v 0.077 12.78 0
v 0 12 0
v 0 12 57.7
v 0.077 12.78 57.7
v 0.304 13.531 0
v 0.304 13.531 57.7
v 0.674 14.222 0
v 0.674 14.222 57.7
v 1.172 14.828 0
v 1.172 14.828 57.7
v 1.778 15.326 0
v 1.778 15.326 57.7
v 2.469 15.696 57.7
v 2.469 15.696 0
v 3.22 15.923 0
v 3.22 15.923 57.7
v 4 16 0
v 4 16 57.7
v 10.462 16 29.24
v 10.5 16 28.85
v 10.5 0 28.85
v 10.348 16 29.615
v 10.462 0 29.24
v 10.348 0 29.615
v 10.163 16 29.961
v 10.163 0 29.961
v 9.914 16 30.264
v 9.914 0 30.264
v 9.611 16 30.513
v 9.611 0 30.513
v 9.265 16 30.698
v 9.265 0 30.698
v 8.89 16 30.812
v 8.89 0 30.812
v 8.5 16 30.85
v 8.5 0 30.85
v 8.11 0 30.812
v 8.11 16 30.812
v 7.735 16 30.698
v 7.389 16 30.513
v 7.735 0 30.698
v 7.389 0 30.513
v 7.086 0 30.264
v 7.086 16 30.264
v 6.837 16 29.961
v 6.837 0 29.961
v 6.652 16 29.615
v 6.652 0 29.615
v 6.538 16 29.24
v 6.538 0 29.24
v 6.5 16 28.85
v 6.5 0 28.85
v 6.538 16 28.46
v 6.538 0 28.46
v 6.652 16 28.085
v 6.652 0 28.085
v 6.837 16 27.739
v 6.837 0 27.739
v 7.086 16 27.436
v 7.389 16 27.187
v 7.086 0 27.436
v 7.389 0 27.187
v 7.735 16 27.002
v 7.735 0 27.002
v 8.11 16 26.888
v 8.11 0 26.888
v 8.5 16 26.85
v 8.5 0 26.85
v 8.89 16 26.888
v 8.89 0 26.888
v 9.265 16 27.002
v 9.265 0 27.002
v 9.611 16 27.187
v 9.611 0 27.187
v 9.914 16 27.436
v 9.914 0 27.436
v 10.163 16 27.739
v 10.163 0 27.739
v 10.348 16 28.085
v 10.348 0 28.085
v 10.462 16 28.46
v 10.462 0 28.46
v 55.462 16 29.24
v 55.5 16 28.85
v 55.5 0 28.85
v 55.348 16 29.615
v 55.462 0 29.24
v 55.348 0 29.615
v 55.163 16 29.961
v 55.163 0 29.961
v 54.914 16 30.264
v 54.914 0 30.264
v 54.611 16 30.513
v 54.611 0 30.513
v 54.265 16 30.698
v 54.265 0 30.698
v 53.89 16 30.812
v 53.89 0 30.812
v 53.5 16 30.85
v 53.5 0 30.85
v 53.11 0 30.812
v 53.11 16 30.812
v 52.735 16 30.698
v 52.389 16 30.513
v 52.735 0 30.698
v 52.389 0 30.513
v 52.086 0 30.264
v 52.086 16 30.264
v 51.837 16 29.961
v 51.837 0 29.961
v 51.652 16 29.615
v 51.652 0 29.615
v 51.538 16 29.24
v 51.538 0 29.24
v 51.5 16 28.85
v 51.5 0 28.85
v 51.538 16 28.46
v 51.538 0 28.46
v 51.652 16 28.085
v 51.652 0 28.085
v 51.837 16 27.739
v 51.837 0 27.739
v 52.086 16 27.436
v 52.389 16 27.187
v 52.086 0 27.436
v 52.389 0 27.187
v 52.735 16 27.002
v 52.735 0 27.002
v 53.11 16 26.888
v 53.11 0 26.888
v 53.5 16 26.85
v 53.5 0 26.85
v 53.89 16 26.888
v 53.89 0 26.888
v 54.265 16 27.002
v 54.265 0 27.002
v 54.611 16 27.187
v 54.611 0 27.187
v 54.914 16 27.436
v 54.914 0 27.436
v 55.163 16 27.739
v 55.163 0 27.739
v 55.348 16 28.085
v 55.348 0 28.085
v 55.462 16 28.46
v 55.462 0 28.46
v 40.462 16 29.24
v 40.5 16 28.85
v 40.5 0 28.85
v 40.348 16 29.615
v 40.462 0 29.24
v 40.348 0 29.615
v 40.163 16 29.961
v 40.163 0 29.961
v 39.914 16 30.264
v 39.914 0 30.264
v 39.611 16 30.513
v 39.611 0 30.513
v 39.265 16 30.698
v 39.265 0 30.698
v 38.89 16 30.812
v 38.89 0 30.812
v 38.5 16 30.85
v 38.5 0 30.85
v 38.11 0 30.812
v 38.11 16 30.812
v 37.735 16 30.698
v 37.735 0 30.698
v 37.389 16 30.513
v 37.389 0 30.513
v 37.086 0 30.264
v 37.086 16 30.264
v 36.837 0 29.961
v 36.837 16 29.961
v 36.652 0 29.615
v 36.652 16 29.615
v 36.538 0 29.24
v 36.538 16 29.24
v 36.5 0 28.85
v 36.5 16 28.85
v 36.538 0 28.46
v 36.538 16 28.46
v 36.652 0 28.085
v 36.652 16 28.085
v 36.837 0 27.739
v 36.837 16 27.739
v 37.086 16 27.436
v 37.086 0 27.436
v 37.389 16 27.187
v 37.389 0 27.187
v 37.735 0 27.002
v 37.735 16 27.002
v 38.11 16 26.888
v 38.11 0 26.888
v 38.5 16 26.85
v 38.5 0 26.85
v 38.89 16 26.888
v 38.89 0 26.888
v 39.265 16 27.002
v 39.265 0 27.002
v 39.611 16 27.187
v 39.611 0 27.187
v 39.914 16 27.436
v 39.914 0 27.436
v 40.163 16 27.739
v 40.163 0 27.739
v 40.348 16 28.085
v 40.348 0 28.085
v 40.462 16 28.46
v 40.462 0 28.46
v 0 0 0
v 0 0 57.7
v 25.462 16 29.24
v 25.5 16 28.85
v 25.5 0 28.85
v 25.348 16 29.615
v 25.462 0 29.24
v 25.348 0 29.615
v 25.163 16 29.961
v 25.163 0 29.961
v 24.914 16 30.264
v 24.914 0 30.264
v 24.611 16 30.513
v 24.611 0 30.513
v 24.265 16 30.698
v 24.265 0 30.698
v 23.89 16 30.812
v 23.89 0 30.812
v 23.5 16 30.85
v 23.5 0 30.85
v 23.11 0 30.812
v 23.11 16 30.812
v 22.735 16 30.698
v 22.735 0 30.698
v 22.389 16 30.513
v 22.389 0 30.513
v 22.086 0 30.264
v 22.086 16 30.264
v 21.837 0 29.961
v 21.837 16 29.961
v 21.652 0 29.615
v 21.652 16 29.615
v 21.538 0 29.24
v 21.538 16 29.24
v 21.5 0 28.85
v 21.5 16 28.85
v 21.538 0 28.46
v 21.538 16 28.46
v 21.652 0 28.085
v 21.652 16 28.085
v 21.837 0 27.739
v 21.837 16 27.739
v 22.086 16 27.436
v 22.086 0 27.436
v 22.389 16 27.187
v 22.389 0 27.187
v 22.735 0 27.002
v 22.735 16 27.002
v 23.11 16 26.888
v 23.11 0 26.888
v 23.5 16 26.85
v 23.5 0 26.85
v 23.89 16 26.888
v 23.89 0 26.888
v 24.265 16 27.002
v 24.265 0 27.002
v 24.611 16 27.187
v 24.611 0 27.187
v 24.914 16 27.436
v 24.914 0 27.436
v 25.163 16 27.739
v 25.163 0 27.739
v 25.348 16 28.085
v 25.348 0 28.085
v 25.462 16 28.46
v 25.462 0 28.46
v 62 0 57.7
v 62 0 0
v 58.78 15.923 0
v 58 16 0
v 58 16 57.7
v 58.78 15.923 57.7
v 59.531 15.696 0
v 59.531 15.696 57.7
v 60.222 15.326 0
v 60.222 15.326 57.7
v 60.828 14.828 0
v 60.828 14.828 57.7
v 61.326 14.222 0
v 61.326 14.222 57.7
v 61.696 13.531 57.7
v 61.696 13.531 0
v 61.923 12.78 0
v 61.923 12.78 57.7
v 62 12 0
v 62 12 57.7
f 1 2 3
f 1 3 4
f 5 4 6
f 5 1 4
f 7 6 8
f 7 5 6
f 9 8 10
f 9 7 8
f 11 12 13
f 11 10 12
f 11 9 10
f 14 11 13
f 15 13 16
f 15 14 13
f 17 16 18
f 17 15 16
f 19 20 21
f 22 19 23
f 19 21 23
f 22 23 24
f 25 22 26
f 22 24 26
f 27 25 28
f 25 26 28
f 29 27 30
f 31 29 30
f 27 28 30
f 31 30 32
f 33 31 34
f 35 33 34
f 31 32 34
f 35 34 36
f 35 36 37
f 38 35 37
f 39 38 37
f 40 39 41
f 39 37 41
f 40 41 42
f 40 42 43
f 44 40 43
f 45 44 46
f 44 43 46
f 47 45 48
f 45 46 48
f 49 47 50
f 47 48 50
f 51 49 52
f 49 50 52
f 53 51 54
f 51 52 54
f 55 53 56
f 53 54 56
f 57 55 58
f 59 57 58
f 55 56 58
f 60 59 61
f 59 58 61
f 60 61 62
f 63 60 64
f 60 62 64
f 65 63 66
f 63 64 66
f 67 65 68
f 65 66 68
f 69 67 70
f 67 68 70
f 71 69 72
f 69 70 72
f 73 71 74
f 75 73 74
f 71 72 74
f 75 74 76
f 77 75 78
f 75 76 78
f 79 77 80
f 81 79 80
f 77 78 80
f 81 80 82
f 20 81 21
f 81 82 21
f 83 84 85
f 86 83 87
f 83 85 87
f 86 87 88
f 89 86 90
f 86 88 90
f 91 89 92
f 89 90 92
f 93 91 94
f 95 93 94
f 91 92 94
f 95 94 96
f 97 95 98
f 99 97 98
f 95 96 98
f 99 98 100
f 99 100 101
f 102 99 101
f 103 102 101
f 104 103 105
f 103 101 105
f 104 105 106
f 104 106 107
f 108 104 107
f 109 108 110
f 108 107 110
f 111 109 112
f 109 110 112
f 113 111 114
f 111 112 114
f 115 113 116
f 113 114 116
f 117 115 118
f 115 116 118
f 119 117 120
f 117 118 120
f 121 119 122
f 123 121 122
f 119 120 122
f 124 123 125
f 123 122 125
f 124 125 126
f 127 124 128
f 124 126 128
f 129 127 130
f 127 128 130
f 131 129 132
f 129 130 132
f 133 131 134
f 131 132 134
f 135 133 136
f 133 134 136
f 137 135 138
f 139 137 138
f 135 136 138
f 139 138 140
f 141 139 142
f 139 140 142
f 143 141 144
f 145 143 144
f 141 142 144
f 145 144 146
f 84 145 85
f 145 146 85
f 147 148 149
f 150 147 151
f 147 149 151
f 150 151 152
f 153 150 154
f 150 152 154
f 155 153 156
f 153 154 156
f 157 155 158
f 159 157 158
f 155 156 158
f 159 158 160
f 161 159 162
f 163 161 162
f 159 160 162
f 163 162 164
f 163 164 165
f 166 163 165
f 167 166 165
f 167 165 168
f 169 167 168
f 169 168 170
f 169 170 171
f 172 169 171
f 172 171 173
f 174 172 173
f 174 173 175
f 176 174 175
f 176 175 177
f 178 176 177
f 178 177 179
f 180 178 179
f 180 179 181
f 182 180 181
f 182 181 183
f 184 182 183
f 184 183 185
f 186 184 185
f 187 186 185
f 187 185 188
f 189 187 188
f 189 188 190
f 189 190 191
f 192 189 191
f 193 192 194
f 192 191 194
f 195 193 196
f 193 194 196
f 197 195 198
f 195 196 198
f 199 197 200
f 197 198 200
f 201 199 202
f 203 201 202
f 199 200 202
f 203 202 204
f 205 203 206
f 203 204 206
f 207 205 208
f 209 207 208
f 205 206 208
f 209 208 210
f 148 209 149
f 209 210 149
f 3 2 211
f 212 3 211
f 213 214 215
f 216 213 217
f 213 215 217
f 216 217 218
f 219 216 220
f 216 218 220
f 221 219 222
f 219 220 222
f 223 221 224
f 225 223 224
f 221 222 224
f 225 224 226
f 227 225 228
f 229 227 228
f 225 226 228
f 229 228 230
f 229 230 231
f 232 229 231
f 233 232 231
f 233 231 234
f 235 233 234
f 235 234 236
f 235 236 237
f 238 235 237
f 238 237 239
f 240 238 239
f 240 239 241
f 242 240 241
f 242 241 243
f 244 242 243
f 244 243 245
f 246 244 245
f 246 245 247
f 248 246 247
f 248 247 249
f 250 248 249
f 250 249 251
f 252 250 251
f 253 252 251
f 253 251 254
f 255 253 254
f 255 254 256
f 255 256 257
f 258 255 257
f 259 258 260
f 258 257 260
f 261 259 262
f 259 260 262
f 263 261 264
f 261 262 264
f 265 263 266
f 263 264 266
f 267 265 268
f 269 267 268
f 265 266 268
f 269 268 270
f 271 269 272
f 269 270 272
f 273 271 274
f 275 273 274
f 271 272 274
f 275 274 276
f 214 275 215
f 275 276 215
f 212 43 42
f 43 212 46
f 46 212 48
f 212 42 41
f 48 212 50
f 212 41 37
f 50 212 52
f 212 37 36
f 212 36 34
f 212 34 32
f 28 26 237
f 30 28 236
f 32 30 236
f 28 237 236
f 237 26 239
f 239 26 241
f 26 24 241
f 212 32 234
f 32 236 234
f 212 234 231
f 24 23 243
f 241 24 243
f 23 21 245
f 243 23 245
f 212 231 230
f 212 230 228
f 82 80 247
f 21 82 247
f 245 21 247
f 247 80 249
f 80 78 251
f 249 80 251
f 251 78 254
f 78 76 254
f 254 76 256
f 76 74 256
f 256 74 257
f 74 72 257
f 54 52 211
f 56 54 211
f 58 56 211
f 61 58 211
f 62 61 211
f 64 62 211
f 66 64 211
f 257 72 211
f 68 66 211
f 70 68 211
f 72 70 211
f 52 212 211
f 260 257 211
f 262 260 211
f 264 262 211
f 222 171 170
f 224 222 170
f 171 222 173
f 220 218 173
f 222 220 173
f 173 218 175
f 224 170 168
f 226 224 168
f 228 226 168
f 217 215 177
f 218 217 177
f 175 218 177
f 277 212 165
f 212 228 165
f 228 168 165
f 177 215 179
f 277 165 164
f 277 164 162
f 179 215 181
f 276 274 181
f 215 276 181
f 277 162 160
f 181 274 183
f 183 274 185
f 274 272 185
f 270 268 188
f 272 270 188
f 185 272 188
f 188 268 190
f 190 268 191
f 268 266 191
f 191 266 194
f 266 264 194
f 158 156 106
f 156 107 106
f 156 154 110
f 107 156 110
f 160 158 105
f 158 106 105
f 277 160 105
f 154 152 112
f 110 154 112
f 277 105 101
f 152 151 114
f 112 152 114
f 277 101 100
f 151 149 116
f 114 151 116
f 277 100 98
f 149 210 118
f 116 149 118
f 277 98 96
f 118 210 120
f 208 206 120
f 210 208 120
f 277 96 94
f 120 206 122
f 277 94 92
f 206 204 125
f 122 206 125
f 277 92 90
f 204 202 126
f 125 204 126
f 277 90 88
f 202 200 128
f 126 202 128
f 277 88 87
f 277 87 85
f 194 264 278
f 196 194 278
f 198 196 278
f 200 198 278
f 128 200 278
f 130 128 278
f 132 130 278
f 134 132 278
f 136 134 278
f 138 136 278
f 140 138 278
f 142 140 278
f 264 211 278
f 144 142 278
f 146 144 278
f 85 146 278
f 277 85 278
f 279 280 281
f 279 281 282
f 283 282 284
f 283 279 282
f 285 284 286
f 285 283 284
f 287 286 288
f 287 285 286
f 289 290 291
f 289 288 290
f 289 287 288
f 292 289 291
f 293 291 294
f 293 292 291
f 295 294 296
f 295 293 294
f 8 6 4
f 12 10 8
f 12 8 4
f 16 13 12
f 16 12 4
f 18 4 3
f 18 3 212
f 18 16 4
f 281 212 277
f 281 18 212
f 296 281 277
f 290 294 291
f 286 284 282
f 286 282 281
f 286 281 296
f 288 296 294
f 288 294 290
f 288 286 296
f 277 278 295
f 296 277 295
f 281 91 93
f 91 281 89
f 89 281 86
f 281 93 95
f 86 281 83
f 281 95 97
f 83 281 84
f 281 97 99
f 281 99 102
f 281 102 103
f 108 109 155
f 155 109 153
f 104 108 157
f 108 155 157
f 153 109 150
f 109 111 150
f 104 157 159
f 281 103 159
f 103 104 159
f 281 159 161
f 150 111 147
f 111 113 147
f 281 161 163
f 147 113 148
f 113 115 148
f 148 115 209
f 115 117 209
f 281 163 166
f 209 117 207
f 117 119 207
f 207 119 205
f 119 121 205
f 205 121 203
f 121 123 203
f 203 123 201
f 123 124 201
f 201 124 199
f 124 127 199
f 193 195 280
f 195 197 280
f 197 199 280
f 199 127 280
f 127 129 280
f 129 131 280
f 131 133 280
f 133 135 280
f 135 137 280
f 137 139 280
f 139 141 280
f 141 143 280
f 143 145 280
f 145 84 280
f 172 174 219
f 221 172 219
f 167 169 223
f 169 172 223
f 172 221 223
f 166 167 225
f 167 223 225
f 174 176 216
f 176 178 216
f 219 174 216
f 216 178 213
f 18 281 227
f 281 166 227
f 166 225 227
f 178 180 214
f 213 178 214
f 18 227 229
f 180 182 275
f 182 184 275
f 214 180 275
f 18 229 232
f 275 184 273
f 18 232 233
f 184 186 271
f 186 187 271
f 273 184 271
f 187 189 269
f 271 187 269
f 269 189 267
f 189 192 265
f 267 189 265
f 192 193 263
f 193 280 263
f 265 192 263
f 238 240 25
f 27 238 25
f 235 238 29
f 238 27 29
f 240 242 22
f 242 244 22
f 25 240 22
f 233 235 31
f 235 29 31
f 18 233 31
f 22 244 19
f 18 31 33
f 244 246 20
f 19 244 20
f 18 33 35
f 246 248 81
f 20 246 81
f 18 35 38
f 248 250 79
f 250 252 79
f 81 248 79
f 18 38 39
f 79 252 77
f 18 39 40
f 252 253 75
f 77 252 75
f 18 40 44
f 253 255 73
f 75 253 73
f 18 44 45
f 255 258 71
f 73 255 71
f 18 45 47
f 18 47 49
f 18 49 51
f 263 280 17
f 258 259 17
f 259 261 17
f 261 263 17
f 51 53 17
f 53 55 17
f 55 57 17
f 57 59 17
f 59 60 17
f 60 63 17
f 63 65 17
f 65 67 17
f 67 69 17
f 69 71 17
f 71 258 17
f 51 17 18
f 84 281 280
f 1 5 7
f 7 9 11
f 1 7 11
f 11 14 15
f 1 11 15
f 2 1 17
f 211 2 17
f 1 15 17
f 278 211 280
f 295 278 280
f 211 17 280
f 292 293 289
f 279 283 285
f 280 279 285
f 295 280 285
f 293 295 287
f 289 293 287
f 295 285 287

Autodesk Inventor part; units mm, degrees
ref_plane "YZ Plane" through (0, 0, 0) normal (1, 0, 0) x (0, 1, 0)
ref_plane "XZ Plane" through (0, 0, 0) normal (0, 1, 0) x (-1, 0, 0)
ref_plane "XY Plane" through (0, 0, 0) normal (0, 0, 1) x (1, 0, 0)
sketch "Sketch1" plane through (0, 0, 0) normal (0, 0, 1) x (1, 0, 0)
  line L0 (0, 0) -> (62, 0)
  line L1 (62, 0) -> (62, 12)
  line L2 (58, 16) -> (4, 16)
  line L3 (0, 12) -> (0, 0)
  arc A0 (4, 16) -> (0, 12) centre (4, 12) ccw
  arc A1 (62, 12) -> (58, 16) centre (58, 12) ccw
  point P0 (0, 16)
  dimension "d0" = 16
  dimension "d1" = 62
  dimension "d2" = 4
extrude "Extrusion1" add sketch "Sketch1" along normal blind 57.7
sketch "Sketch2" plane through (0, 0, 0) normal (0, -1, 0) x (1, 0, 0)
  line L0 (62, 0) -> (62, 57.7) projected
  line L1 (62, 28.85) -> (0, 28.85) construction
  line L2 (0, 0) -> (0, 57.7) projected
  circle A0 centre (31, 28.85) radius 22.5 construction
  circle A1 centre (53.5, 28.85) radius 2
  circle A2 centre (8.5, 28.85) radius 2
  circle A3 centre (31, 28.85) radius 7.5 construction
  circle A4 centre (38.5, 28.85) radius 2
  circle A5 centre (23.5, 28.85) radius 2
  dimension "d5" = 45
  dimension "d8" = 4
  dimension "d9" = 15
extrude "Extrusion2" cut sketch "Sketch2" against normal through all
properties part number "4aa-holder"
